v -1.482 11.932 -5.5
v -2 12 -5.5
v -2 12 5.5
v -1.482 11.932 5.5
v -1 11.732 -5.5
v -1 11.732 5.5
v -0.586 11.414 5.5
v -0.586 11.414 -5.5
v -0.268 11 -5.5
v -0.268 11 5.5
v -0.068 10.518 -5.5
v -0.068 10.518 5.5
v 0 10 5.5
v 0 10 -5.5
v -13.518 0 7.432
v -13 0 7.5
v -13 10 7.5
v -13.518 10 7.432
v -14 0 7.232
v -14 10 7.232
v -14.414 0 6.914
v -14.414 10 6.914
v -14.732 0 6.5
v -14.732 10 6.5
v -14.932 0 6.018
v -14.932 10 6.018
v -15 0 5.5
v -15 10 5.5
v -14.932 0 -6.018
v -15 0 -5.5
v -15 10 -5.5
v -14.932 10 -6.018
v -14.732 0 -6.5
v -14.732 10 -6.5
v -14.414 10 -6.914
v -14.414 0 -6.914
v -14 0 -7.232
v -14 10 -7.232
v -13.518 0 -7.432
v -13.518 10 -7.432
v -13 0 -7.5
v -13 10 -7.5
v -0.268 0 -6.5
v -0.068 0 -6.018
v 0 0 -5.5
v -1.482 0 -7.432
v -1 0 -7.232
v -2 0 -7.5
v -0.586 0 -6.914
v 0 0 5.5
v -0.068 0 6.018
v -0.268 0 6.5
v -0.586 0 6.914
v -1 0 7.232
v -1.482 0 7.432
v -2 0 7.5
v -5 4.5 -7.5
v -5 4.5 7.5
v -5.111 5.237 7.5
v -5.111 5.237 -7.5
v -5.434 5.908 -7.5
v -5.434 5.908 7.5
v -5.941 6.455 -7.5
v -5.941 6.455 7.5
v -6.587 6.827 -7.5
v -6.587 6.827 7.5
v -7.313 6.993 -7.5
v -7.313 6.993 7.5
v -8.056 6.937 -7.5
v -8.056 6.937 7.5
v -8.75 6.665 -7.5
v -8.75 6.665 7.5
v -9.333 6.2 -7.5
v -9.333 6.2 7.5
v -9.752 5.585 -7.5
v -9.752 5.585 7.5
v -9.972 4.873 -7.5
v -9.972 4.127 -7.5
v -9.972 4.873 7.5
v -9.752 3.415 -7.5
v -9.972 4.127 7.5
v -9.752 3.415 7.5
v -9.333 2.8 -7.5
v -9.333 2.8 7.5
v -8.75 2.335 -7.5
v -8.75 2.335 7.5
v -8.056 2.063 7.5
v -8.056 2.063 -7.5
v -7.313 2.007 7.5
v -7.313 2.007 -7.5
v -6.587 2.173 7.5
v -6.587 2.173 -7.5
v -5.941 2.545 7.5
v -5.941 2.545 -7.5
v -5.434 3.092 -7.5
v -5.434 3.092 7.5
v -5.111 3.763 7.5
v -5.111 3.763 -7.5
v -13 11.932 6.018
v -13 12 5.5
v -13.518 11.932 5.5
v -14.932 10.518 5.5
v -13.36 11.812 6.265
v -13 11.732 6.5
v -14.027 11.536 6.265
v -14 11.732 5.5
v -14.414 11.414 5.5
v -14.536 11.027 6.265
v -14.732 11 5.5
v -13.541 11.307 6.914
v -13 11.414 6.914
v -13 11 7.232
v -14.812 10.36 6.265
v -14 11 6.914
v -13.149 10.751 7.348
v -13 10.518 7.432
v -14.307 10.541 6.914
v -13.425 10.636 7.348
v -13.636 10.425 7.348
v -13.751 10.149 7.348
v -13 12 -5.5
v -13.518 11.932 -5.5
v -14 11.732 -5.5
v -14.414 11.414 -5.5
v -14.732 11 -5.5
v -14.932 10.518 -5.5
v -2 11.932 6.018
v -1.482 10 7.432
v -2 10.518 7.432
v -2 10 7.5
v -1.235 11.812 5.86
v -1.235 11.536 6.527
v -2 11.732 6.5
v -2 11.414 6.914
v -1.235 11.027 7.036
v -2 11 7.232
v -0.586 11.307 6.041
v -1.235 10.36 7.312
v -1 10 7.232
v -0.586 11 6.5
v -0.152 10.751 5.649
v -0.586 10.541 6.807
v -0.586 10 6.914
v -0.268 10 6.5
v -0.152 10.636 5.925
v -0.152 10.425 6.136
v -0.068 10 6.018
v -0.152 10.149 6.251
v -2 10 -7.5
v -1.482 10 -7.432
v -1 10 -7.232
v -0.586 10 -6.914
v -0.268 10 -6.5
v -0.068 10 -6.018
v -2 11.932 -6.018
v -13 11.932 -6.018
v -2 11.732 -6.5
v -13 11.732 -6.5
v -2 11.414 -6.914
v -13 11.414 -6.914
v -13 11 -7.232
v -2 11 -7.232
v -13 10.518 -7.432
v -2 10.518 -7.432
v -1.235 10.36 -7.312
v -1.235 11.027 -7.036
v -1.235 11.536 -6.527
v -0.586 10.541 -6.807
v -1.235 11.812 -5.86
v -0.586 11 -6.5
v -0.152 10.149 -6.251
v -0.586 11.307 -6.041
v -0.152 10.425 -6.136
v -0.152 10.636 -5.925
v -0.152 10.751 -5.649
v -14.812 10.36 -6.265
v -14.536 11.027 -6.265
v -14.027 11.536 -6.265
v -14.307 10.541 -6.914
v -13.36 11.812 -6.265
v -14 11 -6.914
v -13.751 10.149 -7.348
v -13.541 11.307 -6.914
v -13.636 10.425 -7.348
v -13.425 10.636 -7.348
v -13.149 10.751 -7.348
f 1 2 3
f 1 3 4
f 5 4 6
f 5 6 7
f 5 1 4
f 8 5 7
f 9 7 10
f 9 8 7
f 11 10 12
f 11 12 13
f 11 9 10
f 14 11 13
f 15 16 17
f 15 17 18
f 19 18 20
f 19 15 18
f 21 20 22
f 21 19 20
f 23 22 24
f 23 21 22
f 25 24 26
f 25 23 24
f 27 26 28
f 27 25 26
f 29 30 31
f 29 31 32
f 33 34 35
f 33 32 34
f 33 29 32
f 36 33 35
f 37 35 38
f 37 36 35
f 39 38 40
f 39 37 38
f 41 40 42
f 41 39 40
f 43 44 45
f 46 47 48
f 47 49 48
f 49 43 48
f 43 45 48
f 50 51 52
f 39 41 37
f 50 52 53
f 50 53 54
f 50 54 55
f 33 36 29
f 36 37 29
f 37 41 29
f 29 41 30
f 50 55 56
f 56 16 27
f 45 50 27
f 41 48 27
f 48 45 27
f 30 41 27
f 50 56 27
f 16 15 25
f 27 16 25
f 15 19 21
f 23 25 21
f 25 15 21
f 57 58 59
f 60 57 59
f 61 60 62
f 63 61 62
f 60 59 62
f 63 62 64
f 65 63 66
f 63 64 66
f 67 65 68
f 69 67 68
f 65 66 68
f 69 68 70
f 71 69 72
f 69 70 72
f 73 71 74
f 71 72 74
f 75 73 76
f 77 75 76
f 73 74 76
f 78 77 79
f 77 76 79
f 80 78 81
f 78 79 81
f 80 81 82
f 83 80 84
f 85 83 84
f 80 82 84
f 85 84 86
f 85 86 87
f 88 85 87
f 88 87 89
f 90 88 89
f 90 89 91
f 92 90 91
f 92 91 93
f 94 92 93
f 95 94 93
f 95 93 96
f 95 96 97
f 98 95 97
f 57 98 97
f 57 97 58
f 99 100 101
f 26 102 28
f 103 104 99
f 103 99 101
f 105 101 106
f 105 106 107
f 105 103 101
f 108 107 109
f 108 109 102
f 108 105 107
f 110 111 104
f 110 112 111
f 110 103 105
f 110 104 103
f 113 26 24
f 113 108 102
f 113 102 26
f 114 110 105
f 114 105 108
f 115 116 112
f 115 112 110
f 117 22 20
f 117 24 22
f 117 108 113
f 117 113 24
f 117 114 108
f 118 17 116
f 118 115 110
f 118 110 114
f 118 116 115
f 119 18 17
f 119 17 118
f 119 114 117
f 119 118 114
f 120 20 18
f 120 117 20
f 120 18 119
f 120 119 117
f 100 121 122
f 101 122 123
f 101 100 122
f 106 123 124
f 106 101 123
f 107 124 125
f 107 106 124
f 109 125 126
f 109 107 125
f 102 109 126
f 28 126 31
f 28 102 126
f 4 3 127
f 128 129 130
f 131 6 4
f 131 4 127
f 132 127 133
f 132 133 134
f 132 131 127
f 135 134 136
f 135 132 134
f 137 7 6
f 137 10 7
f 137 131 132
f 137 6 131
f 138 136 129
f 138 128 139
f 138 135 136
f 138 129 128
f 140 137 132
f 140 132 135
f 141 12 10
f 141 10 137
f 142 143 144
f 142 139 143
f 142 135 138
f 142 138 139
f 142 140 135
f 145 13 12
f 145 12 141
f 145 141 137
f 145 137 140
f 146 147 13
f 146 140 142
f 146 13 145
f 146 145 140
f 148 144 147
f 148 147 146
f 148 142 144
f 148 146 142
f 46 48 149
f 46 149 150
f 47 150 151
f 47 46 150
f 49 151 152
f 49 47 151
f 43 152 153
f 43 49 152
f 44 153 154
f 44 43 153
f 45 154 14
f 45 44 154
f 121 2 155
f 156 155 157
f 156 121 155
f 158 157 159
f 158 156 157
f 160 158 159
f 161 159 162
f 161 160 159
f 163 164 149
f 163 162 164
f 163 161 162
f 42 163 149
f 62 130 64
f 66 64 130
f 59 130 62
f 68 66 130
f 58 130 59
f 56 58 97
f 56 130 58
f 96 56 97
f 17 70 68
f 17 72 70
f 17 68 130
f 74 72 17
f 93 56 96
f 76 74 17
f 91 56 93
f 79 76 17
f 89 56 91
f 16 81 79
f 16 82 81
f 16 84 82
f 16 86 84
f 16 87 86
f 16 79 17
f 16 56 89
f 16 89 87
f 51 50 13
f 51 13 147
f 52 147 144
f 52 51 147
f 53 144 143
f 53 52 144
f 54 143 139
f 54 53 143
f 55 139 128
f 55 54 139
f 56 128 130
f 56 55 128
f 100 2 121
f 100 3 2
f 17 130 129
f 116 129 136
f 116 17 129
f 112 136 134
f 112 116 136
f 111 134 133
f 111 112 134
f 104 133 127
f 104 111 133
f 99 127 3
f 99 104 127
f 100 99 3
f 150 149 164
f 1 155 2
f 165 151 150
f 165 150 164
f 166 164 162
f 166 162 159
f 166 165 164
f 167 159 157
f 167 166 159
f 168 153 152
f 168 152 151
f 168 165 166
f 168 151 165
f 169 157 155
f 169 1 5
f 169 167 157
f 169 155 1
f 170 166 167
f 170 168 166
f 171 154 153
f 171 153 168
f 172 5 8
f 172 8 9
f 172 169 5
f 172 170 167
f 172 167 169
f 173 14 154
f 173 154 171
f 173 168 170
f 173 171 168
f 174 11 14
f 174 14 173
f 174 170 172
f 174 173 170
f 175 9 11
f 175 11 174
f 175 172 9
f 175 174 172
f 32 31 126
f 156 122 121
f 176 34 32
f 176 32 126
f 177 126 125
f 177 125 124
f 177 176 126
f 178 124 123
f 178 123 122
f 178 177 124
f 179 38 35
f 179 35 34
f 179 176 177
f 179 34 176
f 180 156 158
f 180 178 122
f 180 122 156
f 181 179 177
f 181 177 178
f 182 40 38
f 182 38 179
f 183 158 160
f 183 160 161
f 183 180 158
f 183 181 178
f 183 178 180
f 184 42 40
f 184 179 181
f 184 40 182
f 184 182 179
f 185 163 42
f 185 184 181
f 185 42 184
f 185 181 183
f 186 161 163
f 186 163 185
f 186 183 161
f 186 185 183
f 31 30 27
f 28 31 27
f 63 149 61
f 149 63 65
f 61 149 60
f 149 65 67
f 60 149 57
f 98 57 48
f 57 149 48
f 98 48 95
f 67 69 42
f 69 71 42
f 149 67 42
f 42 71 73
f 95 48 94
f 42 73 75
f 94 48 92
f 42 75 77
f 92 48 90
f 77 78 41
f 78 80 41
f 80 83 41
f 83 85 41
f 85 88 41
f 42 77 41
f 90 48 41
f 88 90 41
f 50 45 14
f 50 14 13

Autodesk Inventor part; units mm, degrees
ref_plane "YZ Plane" through (0, 0, 0) normal (1, 0, 0) x (0, 1, 0)
ref_plane "XZ Plane" through (0, 0, 0) normal (0, 1, 0) x (-1, 0, 0)
ref_plane "XY Plane" through (0, 0, 0) normal (0, 0, 1) x (1, 0, 0)
sketch "Sketch1" plane through (0, 0, 0) normal (0, 1, 0) x (-1, 0, 0)
  point P0 (0, 0)
sketch "Sketch2" plane through (0, 0, 0) normal (0, 1, 0) x (-1, 0, 0)
  line L0 (0, 0) -> (0, -7.5)
  line L1 (0, 0) -> (0, 7.5)
  line L2 (0, 7.5) -> (15, 7.5)
  line L3 (0, -7.5) -> (15, -7.5)
  line L4 (15, -7.5) -> (15, 7.5)
  dimension "d0" = 7.5
  dimension "d1" = 7.5
  dimension "d2" = 15
extrude "Extrusion1" add sketch "Sketch2" along normal blind 12
sketch "Sketch3" plane through (-15, 0, 7.5) normal (0, 0, 1) x (1, 0, 0)
  line L0 (0, 0) -> (0, 12) projected
  circle A0 centre (7.5, 4.5) radius 2.5
  line L1 (0, 12) -> (15, 12) projected
  point P0 (15, 0)
  dimension "d6" = 5
  dimension "d12" = 7.5
fillet "Fillet1" radius 2 4 edges at (0, 12, -3.75) (-15, 12, 0) (-7.5, 12, 7.5) (-7.5, 12, -7.5)
extrude "Extrusion2" cut sketch "Sketch3" against normal blind 15
fillet "Fillet2" radius 2 6 edges at (-14.4142, 11.4142, 6.9142) (-15, 5, 7.5) (-0.5858, 11.4142, 6.9142) (0, 5, 7.5) (-14.4142, 11.4142, -6.9142) (-15, 5, -7.5)
fillet "Fillet3" radius 2 2 edges at (-0.5858, 11.4142, -6.9142) (0, 5, -7.5)
properties part number "Connector"
